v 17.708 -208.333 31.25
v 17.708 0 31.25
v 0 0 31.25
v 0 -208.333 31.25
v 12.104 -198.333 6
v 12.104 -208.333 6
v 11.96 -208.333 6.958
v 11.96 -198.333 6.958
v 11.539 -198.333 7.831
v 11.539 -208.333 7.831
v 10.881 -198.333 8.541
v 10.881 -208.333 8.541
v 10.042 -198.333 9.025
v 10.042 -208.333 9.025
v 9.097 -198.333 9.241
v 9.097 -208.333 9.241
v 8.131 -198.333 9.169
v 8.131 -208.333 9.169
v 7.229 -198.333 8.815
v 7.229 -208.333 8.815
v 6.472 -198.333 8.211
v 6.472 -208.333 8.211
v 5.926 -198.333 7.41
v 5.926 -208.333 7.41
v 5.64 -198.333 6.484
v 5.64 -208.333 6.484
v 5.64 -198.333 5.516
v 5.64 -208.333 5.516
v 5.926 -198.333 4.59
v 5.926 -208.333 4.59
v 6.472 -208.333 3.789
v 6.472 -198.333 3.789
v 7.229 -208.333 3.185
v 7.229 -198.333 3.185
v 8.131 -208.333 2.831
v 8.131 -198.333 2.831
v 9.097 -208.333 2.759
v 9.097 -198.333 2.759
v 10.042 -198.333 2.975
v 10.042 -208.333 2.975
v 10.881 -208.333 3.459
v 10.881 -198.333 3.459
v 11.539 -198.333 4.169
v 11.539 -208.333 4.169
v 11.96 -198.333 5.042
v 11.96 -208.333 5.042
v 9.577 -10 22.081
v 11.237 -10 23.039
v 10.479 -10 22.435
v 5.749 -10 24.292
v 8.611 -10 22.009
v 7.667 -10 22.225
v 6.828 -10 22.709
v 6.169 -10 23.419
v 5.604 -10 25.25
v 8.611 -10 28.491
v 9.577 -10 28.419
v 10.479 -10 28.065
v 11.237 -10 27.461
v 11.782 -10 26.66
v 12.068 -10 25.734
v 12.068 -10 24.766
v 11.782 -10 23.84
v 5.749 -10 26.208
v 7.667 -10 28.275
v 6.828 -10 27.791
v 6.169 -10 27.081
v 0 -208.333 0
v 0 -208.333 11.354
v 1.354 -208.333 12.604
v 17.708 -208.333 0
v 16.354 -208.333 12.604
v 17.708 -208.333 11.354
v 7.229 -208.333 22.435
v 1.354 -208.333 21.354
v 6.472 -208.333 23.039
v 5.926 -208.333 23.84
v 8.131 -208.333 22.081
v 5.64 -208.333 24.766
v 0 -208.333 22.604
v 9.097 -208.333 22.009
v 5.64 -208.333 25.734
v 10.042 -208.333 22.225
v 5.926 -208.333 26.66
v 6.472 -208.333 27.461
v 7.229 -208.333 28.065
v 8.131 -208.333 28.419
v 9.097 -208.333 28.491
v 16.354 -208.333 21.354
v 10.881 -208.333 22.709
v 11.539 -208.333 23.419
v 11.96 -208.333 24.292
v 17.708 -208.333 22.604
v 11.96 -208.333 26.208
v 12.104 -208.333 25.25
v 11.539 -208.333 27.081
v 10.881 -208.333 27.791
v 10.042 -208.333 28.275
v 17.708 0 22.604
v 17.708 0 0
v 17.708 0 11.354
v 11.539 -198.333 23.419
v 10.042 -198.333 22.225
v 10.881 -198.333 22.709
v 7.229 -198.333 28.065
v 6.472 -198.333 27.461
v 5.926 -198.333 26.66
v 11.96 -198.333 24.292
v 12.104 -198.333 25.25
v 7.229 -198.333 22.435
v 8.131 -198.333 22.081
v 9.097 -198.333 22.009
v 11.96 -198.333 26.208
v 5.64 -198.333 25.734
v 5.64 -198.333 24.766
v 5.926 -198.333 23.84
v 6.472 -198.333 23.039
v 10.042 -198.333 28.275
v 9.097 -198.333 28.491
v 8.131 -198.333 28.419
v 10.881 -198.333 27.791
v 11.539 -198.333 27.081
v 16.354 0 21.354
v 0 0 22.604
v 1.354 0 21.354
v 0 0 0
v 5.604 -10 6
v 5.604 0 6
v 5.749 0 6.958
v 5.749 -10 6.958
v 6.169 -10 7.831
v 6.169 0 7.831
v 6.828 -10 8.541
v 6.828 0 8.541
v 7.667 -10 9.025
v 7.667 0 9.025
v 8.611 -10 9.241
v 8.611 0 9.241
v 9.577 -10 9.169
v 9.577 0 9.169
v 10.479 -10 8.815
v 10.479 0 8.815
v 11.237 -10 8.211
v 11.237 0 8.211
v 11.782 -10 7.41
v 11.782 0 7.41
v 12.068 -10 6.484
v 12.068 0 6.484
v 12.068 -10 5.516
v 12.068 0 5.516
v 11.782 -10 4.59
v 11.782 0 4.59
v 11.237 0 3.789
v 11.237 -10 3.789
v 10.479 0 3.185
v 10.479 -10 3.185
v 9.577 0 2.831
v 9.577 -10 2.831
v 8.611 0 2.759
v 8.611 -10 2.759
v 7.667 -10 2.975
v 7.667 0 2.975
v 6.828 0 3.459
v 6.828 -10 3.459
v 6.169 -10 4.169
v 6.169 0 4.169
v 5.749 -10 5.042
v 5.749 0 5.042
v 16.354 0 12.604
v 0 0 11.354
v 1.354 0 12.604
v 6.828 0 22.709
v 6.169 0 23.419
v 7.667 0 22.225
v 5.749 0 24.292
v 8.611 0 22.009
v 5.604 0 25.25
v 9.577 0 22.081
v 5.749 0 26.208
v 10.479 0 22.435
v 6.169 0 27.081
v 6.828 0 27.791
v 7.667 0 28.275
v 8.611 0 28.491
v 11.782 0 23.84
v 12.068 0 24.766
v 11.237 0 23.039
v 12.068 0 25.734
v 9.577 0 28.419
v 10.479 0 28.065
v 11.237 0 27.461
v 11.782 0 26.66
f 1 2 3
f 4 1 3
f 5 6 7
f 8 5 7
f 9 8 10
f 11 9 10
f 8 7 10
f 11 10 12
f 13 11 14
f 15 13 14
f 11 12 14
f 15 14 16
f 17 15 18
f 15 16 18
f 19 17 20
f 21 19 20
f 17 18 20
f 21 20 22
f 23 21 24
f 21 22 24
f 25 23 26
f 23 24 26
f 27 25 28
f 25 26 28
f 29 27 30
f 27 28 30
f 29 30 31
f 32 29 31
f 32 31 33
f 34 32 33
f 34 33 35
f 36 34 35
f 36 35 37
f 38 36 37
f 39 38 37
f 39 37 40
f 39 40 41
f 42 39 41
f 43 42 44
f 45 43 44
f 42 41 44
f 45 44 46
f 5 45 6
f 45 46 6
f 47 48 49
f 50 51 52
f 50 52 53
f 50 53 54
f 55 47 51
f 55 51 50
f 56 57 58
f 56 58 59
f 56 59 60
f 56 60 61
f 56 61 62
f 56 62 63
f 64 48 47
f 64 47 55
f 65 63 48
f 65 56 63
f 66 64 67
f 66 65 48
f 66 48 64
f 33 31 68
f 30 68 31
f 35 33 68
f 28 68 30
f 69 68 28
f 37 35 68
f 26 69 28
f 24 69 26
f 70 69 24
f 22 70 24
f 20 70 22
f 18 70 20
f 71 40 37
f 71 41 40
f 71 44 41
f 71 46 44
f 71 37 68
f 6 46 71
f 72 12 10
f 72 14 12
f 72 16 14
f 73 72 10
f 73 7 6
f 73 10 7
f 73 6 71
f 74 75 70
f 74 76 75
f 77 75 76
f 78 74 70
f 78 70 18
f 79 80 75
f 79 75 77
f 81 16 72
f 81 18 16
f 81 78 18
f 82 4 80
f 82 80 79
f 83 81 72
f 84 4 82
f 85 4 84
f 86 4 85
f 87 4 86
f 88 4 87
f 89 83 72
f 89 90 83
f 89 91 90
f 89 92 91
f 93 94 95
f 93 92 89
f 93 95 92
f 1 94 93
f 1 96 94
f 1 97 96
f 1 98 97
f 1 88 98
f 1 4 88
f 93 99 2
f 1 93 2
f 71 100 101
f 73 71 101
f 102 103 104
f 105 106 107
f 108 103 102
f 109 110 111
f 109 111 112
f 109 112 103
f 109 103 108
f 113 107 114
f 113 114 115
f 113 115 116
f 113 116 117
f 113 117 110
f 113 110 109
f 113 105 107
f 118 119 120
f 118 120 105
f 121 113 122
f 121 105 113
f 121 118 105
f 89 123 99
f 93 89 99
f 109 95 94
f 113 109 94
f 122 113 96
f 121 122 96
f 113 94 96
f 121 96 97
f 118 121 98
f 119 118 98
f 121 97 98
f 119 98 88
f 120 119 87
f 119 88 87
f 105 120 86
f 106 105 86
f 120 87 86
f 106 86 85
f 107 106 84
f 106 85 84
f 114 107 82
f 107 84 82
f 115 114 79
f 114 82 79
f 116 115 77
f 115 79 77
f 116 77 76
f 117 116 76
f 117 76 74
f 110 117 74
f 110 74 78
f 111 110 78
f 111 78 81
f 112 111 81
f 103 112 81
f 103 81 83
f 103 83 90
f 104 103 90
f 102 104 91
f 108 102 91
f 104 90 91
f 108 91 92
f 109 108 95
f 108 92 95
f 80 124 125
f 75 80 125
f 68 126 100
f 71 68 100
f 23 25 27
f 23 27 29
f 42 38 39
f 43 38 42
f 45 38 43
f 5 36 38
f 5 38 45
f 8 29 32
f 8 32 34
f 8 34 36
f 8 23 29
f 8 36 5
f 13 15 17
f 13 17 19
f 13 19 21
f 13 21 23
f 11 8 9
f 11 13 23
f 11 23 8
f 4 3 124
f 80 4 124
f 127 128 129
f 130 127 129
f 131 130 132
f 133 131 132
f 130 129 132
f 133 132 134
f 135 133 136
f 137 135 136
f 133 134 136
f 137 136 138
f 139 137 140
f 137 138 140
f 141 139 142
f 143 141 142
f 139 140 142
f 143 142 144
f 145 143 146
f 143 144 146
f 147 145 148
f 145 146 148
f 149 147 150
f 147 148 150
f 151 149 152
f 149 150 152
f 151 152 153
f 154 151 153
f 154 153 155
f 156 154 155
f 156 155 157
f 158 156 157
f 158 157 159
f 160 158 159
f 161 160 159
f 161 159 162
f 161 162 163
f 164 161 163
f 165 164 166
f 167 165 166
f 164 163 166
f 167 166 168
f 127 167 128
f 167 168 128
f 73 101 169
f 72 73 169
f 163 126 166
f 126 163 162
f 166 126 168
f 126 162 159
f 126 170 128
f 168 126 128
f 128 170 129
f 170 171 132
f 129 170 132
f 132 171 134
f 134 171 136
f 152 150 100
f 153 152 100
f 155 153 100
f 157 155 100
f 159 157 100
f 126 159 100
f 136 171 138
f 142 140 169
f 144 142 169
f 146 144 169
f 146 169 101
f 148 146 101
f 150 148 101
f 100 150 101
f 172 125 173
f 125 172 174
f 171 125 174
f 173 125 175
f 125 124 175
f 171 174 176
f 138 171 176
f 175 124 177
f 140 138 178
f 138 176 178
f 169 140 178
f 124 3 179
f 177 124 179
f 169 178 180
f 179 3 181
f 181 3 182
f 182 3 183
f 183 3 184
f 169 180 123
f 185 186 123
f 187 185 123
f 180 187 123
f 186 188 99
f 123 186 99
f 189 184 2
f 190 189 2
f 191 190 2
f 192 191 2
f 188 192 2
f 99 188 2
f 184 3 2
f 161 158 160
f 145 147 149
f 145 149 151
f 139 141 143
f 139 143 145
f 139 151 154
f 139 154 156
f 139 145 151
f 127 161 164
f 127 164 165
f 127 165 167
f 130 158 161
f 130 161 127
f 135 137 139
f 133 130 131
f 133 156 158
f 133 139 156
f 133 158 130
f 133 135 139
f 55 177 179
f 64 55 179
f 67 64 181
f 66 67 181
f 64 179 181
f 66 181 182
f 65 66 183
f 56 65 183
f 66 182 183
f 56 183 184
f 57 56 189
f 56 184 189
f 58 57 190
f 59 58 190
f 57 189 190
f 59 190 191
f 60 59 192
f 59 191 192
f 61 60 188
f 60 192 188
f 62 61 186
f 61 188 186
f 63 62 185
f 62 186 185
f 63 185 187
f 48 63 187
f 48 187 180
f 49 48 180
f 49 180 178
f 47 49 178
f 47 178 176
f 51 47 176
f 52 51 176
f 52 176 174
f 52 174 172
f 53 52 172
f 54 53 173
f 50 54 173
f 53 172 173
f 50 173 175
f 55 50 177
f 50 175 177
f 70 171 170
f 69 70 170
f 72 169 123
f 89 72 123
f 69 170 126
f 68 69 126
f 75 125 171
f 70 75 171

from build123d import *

# Parameters (mm, degrees)
F1_DEPTH = 208.333333
F2_R     = 3.25
F3_DEPTH = 10
F4_R     = 3.25
F5_DEPTH = 10


with BuildPart() as f1:
    # F0 (on Front) → F1 (new body)
    with BuildSketch(Plane.XZ):
        Polygon((0, 0), (8.854167, 0), (17.708333, 0), (17.708333, 11.354167), (16.354167, 12.604167), (16.354167, 21.354167), (17.708333, 22.604167), (17.708333, 31.25), (8.854167, 31.25), (0, 31.25), (0, 22.604167), (1.354167, 21.354167), (1.354167, 12.604167), (0, 11.354167), align=None)
    extrude(amount=F1_DEPTH)

    # F2 (on face) → F3 (cut)
    with BuildSketch(Plane.XZ.offset(208.333333)):
        with Locations((8.854167, 6)):
            Circle(F2_R)
        with Locations((8.854167, 25.25)):
            Circle(F2_R)
    extrude(amount=-F3_DEPTH, mode=Mode.SUBTRACT)

    # F4 (on face) → F5 (cut)
    with BuildSketch(Plane(origin=(0, 0, 0), x_dir=(-1, 0, 0), z_dir=(0, 1, 0))):
        with Locations((-8.854167, 6)):
            Circle(F4_R)
        with Locations((-8.854167, 25.25)):
            Circle(F4_R)
    extrude(amount=-F5_DEPTH, mode=Mode.SUBTRACT)


solid = f1.part
